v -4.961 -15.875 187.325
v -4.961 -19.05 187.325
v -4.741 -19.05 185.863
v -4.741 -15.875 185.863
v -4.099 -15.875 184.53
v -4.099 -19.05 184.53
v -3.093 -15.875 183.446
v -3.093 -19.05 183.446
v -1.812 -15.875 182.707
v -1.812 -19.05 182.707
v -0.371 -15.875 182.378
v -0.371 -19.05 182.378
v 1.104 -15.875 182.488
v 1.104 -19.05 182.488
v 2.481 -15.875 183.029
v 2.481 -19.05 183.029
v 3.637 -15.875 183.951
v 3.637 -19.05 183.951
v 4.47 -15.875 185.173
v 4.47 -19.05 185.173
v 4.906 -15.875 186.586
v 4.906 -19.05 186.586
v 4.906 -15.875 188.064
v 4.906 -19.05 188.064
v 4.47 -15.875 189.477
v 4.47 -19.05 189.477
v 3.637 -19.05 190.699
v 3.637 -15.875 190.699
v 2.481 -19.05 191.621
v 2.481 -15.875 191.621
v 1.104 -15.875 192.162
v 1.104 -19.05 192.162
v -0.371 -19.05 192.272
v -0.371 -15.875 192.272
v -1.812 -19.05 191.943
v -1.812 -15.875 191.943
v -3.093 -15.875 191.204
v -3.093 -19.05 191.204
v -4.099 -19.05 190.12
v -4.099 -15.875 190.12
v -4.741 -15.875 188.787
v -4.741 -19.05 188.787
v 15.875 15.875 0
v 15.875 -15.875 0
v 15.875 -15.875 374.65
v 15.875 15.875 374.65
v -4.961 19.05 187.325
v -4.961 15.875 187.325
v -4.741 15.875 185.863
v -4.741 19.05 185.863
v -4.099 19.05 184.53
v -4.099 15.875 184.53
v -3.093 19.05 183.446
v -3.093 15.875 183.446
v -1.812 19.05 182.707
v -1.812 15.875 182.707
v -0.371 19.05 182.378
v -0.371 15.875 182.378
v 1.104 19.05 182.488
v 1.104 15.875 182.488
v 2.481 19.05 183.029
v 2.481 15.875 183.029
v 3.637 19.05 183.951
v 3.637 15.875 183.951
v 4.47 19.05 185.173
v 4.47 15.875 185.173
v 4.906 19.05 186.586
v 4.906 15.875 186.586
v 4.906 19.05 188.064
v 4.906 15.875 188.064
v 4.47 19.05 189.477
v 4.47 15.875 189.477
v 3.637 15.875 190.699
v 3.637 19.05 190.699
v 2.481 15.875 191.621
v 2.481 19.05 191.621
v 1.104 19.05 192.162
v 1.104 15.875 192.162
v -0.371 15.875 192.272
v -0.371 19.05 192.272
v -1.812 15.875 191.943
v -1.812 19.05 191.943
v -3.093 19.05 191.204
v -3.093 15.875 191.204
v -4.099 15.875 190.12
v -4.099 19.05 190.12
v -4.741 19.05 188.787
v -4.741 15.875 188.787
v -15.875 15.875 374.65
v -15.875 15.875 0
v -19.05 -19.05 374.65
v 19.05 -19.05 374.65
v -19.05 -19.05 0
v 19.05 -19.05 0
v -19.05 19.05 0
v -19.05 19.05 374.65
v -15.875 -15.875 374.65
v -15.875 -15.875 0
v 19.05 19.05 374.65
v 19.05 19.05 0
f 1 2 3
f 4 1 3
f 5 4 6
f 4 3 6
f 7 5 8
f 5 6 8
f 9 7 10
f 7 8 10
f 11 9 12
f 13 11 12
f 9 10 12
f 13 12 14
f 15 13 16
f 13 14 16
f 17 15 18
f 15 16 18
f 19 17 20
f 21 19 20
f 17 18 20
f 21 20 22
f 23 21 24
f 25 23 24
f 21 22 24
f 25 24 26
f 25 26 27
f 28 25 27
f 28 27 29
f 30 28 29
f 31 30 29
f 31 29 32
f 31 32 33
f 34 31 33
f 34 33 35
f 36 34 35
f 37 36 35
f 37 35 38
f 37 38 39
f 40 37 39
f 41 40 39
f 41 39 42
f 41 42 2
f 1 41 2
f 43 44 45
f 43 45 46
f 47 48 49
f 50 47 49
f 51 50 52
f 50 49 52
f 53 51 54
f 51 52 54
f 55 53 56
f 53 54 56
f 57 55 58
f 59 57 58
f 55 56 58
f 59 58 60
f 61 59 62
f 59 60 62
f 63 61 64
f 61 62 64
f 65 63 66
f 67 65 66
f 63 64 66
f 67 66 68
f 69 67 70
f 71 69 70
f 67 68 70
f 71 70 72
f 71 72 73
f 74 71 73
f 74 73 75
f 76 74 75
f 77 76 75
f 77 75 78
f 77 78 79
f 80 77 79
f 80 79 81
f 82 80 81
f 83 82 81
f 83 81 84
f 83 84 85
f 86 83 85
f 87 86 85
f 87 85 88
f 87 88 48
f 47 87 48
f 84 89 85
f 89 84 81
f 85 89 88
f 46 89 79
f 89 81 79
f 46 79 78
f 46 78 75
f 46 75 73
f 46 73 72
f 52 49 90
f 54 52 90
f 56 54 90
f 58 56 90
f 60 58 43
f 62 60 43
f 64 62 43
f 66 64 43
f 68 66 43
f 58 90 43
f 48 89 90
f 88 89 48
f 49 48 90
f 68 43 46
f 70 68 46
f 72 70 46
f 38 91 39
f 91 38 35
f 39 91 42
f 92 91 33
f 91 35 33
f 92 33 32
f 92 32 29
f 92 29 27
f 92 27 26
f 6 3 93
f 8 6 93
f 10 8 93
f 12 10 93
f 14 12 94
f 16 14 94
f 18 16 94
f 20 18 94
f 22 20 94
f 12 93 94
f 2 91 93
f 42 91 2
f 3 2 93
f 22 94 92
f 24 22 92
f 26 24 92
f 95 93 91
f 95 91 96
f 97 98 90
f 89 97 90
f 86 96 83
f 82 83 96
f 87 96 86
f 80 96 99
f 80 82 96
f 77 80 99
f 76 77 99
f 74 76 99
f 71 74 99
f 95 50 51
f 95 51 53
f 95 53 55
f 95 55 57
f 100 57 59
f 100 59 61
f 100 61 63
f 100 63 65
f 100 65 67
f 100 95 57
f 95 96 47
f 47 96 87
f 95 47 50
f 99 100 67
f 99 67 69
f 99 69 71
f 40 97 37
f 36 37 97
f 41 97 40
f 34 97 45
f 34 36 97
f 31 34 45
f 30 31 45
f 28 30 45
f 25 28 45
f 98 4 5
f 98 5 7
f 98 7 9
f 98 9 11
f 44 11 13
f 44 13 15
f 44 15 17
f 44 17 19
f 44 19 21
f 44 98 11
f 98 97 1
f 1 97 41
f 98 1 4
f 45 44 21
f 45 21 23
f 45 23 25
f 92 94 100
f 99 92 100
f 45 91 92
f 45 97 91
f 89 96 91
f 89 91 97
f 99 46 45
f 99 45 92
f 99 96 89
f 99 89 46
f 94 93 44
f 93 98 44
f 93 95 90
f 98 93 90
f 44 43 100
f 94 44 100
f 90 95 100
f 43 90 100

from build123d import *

# Parameters (mm, degrees)
SKETCH1_W                        = 38.1
SKETCH1_H                        = 38.1
SKETCH1_W_2                      = 31.75
SKETCH1_H_2                      = 31.75
BOSS_EXTRUDE1_DEPTH              = 374.65
F_25_64_0_39063_DIAMETER_HOLE1_D = 9.922002


with BuildPart() as part:
    # Sketch1 → Boss-Extrude1 (new body)
    with BuildSketch(Plane.XY):
        Rectangle(SKETCH1_W, SKETCH1_H)
        Rectangle(SKETCH1_W_2, SKETCH1_H_2, mode=Mode.SUBTRACT)
    extrude(amount=BOSS_EXTRUDE1_DEPTH)

    # 25/64 (0.39063) Diameter Hole1 (through all)
    with Locations(Plane(origin=(0, 19.05, 0), x_dir=(1, 0, 0), z_dir=(0, 1, 0))):
        with Locations((0, -187.325)):
            Hole(F_25_64_0_39063_DIAMETER_HOLE1_D / 2)


solid = part.part
